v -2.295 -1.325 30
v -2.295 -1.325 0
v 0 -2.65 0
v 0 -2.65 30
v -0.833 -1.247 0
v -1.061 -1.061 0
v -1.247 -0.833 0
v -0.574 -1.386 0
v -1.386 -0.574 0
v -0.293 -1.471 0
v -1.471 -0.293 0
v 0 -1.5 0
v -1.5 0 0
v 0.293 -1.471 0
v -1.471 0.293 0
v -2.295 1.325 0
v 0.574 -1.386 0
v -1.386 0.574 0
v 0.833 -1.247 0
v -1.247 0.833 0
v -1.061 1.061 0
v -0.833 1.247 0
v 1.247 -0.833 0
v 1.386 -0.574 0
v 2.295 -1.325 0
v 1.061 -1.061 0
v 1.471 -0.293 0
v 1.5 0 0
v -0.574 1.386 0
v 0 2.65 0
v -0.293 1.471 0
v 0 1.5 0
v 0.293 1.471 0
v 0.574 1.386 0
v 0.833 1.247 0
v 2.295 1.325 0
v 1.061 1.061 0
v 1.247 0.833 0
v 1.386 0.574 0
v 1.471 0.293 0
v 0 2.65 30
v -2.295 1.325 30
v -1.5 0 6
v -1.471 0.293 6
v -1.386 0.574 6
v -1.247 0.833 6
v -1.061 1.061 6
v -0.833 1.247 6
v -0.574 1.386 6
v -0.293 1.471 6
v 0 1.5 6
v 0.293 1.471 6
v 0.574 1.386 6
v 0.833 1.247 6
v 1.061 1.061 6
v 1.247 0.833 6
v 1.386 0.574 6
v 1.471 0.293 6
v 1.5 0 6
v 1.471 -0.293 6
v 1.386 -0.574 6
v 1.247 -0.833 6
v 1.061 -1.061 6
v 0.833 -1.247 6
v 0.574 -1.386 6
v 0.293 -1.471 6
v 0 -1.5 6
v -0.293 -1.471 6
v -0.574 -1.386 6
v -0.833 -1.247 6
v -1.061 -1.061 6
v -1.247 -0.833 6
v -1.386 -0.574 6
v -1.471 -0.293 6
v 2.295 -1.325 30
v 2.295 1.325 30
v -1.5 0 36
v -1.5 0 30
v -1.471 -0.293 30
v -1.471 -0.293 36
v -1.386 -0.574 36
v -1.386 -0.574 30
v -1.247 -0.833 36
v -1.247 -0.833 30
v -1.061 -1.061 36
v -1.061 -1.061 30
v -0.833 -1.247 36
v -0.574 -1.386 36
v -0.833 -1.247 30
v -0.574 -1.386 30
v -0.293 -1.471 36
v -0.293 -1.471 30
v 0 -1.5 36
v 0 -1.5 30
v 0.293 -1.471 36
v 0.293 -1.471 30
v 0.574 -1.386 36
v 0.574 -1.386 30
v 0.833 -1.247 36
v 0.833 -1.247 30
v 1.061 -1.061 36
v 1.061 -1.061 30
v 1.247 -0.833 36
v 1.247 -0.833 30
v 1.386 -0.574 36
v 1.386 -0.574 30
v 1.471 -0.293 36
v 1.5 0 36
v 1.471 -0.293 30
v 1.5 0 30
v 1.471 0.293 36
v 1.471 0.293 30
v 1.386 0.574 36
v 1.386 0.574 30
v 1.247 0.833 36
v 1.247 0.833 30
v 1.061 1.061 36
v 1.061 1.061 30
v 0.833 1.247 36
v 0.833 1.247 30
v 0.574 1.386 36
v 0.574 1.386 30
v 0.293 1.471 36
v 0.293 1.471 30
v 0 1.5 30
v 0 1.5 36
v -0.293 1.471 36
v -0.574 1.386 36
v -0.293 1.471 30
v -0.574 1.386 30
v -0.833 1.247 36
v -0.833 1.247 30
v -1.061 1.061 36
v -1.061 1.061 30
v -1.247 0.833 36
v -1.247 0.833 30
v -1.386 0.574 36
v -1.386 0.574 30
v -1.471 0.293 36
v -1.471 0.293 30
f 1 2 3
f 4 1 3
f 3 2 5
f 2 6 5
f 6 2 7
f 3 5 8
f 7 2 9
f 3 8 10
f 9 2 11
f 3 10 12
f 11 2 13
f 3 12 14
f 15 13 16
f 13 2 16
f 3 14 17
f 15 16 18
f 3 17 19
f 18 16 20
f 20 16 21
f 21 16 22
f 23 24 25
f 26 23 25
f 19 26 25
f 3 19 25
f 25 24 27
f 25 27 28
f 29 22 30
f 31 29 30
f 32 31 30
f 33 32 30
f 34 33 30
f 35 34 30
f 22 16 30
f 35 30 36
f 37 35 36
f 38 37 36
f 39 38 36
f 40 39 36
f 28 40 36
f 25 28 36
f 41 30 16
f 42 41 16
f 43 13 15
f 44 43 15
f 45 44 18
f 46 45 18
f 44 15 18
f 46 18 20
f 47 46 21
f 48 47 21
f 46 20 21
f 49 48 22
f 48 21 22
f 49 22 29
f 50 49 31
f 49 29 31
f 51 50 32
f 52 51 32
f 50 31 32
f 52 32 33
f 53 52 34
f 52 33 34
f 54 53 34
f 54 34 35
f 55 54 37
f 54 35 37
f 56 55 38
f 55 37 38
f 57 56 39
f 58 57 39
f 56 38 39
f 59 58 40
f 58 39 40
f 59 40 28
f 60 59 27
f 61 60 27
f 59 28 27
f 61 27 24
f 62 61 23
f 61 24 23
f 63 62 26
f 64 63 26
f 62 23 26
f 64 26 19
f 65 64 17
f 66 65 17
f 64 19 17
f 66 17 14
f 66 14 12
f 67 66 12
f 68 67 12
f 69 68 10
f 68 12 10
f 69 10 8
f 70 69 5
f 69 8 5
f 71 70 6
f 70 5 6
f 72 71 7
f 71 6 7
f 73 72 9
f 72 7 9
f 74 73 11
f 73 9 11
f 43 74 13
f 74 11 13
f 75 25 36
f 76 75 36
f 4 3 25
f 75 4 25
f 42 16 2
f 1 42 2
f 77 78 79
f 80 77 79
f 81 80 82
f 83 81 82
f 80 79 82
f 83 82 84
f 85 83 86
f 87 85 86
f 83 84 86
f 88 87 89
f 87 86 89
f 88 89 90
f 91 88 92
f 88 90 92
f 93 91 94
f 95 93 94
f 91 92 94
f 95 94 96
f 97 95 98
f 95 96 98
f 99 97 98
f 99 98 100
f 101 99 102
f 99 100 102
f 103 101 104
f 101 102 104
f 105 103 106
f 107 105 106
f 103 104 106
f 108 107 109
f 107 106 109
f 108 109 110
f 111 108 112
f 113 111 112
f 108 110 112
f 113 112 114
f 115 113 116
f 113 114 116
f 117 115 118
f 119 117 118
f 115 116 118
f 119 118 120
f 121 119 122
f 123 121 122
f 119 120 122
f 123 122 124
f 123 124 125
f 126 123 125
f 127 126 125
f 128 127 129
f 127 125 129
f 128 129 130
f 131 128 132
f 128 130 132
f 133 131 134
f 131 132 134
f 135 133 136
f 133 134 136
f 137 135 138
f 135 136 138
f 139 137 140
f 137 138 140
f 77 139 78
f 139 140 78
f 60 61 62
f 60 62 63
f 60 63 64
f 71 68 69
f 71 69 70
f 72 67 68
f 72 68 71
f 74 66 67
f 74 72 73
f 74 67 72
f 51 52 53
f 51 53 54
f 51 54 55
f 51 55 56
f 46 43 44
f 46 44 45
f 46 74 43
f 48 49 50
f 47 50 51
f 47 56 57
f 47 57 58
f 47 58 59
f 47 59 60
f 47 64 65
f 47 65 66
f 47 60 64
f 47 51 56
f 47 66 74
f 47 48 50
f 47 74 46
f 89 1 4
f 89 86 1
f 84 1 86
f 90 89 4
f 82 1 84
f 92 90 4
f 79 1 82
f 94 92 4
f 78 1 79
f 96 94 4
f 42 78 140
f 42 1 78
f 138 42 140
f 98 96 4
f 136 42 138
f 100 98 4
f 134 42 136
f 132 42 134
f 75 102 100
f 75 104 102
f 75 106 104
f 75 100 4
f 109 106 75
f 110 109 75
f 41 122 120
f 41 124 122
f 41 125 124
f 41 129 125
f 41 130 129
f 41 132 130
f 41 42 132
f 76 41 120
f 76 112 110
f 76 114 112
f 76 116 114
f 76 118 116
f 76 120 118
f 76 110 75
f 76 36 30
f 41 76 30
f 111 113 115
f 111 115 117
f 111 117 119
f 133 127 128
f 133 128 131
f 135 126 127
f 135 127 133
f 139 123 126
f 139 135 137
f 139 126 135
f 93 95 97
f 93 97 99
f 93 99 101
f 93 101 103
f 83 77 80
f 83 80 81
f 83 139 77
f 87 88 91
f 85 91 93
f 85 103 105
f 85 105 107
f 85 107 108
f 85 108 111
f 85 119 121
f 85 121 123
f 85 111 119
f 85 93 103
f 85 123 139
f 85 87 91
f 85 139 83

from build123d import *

# Parameters (mm, degrees)
BOSS_EXTRUDE1_DEPTH = 30
SKETCH2_R           = 1.5
CUT_EXTRUDE1_DEPTH  = 6
SKETCH3_R           = 1.5
BOSS_EXTRUDE2_DEPTH = 6


with BuildPart() as part:
    # Sketch1 → Boss-Extrude1 (new body)
    with BuildSketch(Plane.XY):
        Polygon((0, 2.65), (-2.29496732, 1.325), (-2.29496732, -1.325), (0, -2.65), (2.29496732, -1.325), (2.29496732, 1.325), align=None)
    extrude(amount=BOSS_EXTRUDE1_DEPTH)

    # Sketch2 → Cut-Extrude1 (cut)
    with BuildSketch(Plane(origin=(0, 0, 0), x_dir=(-1, 0, 0), z_dir=(0, 0, -1))):
        Circle(SKETCH2_R)
    extrude(amount=-CUT_EXTRUDE1_DEPTH, mode=Mode.SUBTRACT)

    # Sketch3 → Boss-Extrude2 (add)
    with BuildSketch(Plane.XY.offset(30)):
        with Locations(Location((0, 0, 0), (0, 0, 180))):
            Circle(SKETCH3_R)
    extrude(amount=BOSS_EXTRUDE2_DEPTH)


solid = part.part
